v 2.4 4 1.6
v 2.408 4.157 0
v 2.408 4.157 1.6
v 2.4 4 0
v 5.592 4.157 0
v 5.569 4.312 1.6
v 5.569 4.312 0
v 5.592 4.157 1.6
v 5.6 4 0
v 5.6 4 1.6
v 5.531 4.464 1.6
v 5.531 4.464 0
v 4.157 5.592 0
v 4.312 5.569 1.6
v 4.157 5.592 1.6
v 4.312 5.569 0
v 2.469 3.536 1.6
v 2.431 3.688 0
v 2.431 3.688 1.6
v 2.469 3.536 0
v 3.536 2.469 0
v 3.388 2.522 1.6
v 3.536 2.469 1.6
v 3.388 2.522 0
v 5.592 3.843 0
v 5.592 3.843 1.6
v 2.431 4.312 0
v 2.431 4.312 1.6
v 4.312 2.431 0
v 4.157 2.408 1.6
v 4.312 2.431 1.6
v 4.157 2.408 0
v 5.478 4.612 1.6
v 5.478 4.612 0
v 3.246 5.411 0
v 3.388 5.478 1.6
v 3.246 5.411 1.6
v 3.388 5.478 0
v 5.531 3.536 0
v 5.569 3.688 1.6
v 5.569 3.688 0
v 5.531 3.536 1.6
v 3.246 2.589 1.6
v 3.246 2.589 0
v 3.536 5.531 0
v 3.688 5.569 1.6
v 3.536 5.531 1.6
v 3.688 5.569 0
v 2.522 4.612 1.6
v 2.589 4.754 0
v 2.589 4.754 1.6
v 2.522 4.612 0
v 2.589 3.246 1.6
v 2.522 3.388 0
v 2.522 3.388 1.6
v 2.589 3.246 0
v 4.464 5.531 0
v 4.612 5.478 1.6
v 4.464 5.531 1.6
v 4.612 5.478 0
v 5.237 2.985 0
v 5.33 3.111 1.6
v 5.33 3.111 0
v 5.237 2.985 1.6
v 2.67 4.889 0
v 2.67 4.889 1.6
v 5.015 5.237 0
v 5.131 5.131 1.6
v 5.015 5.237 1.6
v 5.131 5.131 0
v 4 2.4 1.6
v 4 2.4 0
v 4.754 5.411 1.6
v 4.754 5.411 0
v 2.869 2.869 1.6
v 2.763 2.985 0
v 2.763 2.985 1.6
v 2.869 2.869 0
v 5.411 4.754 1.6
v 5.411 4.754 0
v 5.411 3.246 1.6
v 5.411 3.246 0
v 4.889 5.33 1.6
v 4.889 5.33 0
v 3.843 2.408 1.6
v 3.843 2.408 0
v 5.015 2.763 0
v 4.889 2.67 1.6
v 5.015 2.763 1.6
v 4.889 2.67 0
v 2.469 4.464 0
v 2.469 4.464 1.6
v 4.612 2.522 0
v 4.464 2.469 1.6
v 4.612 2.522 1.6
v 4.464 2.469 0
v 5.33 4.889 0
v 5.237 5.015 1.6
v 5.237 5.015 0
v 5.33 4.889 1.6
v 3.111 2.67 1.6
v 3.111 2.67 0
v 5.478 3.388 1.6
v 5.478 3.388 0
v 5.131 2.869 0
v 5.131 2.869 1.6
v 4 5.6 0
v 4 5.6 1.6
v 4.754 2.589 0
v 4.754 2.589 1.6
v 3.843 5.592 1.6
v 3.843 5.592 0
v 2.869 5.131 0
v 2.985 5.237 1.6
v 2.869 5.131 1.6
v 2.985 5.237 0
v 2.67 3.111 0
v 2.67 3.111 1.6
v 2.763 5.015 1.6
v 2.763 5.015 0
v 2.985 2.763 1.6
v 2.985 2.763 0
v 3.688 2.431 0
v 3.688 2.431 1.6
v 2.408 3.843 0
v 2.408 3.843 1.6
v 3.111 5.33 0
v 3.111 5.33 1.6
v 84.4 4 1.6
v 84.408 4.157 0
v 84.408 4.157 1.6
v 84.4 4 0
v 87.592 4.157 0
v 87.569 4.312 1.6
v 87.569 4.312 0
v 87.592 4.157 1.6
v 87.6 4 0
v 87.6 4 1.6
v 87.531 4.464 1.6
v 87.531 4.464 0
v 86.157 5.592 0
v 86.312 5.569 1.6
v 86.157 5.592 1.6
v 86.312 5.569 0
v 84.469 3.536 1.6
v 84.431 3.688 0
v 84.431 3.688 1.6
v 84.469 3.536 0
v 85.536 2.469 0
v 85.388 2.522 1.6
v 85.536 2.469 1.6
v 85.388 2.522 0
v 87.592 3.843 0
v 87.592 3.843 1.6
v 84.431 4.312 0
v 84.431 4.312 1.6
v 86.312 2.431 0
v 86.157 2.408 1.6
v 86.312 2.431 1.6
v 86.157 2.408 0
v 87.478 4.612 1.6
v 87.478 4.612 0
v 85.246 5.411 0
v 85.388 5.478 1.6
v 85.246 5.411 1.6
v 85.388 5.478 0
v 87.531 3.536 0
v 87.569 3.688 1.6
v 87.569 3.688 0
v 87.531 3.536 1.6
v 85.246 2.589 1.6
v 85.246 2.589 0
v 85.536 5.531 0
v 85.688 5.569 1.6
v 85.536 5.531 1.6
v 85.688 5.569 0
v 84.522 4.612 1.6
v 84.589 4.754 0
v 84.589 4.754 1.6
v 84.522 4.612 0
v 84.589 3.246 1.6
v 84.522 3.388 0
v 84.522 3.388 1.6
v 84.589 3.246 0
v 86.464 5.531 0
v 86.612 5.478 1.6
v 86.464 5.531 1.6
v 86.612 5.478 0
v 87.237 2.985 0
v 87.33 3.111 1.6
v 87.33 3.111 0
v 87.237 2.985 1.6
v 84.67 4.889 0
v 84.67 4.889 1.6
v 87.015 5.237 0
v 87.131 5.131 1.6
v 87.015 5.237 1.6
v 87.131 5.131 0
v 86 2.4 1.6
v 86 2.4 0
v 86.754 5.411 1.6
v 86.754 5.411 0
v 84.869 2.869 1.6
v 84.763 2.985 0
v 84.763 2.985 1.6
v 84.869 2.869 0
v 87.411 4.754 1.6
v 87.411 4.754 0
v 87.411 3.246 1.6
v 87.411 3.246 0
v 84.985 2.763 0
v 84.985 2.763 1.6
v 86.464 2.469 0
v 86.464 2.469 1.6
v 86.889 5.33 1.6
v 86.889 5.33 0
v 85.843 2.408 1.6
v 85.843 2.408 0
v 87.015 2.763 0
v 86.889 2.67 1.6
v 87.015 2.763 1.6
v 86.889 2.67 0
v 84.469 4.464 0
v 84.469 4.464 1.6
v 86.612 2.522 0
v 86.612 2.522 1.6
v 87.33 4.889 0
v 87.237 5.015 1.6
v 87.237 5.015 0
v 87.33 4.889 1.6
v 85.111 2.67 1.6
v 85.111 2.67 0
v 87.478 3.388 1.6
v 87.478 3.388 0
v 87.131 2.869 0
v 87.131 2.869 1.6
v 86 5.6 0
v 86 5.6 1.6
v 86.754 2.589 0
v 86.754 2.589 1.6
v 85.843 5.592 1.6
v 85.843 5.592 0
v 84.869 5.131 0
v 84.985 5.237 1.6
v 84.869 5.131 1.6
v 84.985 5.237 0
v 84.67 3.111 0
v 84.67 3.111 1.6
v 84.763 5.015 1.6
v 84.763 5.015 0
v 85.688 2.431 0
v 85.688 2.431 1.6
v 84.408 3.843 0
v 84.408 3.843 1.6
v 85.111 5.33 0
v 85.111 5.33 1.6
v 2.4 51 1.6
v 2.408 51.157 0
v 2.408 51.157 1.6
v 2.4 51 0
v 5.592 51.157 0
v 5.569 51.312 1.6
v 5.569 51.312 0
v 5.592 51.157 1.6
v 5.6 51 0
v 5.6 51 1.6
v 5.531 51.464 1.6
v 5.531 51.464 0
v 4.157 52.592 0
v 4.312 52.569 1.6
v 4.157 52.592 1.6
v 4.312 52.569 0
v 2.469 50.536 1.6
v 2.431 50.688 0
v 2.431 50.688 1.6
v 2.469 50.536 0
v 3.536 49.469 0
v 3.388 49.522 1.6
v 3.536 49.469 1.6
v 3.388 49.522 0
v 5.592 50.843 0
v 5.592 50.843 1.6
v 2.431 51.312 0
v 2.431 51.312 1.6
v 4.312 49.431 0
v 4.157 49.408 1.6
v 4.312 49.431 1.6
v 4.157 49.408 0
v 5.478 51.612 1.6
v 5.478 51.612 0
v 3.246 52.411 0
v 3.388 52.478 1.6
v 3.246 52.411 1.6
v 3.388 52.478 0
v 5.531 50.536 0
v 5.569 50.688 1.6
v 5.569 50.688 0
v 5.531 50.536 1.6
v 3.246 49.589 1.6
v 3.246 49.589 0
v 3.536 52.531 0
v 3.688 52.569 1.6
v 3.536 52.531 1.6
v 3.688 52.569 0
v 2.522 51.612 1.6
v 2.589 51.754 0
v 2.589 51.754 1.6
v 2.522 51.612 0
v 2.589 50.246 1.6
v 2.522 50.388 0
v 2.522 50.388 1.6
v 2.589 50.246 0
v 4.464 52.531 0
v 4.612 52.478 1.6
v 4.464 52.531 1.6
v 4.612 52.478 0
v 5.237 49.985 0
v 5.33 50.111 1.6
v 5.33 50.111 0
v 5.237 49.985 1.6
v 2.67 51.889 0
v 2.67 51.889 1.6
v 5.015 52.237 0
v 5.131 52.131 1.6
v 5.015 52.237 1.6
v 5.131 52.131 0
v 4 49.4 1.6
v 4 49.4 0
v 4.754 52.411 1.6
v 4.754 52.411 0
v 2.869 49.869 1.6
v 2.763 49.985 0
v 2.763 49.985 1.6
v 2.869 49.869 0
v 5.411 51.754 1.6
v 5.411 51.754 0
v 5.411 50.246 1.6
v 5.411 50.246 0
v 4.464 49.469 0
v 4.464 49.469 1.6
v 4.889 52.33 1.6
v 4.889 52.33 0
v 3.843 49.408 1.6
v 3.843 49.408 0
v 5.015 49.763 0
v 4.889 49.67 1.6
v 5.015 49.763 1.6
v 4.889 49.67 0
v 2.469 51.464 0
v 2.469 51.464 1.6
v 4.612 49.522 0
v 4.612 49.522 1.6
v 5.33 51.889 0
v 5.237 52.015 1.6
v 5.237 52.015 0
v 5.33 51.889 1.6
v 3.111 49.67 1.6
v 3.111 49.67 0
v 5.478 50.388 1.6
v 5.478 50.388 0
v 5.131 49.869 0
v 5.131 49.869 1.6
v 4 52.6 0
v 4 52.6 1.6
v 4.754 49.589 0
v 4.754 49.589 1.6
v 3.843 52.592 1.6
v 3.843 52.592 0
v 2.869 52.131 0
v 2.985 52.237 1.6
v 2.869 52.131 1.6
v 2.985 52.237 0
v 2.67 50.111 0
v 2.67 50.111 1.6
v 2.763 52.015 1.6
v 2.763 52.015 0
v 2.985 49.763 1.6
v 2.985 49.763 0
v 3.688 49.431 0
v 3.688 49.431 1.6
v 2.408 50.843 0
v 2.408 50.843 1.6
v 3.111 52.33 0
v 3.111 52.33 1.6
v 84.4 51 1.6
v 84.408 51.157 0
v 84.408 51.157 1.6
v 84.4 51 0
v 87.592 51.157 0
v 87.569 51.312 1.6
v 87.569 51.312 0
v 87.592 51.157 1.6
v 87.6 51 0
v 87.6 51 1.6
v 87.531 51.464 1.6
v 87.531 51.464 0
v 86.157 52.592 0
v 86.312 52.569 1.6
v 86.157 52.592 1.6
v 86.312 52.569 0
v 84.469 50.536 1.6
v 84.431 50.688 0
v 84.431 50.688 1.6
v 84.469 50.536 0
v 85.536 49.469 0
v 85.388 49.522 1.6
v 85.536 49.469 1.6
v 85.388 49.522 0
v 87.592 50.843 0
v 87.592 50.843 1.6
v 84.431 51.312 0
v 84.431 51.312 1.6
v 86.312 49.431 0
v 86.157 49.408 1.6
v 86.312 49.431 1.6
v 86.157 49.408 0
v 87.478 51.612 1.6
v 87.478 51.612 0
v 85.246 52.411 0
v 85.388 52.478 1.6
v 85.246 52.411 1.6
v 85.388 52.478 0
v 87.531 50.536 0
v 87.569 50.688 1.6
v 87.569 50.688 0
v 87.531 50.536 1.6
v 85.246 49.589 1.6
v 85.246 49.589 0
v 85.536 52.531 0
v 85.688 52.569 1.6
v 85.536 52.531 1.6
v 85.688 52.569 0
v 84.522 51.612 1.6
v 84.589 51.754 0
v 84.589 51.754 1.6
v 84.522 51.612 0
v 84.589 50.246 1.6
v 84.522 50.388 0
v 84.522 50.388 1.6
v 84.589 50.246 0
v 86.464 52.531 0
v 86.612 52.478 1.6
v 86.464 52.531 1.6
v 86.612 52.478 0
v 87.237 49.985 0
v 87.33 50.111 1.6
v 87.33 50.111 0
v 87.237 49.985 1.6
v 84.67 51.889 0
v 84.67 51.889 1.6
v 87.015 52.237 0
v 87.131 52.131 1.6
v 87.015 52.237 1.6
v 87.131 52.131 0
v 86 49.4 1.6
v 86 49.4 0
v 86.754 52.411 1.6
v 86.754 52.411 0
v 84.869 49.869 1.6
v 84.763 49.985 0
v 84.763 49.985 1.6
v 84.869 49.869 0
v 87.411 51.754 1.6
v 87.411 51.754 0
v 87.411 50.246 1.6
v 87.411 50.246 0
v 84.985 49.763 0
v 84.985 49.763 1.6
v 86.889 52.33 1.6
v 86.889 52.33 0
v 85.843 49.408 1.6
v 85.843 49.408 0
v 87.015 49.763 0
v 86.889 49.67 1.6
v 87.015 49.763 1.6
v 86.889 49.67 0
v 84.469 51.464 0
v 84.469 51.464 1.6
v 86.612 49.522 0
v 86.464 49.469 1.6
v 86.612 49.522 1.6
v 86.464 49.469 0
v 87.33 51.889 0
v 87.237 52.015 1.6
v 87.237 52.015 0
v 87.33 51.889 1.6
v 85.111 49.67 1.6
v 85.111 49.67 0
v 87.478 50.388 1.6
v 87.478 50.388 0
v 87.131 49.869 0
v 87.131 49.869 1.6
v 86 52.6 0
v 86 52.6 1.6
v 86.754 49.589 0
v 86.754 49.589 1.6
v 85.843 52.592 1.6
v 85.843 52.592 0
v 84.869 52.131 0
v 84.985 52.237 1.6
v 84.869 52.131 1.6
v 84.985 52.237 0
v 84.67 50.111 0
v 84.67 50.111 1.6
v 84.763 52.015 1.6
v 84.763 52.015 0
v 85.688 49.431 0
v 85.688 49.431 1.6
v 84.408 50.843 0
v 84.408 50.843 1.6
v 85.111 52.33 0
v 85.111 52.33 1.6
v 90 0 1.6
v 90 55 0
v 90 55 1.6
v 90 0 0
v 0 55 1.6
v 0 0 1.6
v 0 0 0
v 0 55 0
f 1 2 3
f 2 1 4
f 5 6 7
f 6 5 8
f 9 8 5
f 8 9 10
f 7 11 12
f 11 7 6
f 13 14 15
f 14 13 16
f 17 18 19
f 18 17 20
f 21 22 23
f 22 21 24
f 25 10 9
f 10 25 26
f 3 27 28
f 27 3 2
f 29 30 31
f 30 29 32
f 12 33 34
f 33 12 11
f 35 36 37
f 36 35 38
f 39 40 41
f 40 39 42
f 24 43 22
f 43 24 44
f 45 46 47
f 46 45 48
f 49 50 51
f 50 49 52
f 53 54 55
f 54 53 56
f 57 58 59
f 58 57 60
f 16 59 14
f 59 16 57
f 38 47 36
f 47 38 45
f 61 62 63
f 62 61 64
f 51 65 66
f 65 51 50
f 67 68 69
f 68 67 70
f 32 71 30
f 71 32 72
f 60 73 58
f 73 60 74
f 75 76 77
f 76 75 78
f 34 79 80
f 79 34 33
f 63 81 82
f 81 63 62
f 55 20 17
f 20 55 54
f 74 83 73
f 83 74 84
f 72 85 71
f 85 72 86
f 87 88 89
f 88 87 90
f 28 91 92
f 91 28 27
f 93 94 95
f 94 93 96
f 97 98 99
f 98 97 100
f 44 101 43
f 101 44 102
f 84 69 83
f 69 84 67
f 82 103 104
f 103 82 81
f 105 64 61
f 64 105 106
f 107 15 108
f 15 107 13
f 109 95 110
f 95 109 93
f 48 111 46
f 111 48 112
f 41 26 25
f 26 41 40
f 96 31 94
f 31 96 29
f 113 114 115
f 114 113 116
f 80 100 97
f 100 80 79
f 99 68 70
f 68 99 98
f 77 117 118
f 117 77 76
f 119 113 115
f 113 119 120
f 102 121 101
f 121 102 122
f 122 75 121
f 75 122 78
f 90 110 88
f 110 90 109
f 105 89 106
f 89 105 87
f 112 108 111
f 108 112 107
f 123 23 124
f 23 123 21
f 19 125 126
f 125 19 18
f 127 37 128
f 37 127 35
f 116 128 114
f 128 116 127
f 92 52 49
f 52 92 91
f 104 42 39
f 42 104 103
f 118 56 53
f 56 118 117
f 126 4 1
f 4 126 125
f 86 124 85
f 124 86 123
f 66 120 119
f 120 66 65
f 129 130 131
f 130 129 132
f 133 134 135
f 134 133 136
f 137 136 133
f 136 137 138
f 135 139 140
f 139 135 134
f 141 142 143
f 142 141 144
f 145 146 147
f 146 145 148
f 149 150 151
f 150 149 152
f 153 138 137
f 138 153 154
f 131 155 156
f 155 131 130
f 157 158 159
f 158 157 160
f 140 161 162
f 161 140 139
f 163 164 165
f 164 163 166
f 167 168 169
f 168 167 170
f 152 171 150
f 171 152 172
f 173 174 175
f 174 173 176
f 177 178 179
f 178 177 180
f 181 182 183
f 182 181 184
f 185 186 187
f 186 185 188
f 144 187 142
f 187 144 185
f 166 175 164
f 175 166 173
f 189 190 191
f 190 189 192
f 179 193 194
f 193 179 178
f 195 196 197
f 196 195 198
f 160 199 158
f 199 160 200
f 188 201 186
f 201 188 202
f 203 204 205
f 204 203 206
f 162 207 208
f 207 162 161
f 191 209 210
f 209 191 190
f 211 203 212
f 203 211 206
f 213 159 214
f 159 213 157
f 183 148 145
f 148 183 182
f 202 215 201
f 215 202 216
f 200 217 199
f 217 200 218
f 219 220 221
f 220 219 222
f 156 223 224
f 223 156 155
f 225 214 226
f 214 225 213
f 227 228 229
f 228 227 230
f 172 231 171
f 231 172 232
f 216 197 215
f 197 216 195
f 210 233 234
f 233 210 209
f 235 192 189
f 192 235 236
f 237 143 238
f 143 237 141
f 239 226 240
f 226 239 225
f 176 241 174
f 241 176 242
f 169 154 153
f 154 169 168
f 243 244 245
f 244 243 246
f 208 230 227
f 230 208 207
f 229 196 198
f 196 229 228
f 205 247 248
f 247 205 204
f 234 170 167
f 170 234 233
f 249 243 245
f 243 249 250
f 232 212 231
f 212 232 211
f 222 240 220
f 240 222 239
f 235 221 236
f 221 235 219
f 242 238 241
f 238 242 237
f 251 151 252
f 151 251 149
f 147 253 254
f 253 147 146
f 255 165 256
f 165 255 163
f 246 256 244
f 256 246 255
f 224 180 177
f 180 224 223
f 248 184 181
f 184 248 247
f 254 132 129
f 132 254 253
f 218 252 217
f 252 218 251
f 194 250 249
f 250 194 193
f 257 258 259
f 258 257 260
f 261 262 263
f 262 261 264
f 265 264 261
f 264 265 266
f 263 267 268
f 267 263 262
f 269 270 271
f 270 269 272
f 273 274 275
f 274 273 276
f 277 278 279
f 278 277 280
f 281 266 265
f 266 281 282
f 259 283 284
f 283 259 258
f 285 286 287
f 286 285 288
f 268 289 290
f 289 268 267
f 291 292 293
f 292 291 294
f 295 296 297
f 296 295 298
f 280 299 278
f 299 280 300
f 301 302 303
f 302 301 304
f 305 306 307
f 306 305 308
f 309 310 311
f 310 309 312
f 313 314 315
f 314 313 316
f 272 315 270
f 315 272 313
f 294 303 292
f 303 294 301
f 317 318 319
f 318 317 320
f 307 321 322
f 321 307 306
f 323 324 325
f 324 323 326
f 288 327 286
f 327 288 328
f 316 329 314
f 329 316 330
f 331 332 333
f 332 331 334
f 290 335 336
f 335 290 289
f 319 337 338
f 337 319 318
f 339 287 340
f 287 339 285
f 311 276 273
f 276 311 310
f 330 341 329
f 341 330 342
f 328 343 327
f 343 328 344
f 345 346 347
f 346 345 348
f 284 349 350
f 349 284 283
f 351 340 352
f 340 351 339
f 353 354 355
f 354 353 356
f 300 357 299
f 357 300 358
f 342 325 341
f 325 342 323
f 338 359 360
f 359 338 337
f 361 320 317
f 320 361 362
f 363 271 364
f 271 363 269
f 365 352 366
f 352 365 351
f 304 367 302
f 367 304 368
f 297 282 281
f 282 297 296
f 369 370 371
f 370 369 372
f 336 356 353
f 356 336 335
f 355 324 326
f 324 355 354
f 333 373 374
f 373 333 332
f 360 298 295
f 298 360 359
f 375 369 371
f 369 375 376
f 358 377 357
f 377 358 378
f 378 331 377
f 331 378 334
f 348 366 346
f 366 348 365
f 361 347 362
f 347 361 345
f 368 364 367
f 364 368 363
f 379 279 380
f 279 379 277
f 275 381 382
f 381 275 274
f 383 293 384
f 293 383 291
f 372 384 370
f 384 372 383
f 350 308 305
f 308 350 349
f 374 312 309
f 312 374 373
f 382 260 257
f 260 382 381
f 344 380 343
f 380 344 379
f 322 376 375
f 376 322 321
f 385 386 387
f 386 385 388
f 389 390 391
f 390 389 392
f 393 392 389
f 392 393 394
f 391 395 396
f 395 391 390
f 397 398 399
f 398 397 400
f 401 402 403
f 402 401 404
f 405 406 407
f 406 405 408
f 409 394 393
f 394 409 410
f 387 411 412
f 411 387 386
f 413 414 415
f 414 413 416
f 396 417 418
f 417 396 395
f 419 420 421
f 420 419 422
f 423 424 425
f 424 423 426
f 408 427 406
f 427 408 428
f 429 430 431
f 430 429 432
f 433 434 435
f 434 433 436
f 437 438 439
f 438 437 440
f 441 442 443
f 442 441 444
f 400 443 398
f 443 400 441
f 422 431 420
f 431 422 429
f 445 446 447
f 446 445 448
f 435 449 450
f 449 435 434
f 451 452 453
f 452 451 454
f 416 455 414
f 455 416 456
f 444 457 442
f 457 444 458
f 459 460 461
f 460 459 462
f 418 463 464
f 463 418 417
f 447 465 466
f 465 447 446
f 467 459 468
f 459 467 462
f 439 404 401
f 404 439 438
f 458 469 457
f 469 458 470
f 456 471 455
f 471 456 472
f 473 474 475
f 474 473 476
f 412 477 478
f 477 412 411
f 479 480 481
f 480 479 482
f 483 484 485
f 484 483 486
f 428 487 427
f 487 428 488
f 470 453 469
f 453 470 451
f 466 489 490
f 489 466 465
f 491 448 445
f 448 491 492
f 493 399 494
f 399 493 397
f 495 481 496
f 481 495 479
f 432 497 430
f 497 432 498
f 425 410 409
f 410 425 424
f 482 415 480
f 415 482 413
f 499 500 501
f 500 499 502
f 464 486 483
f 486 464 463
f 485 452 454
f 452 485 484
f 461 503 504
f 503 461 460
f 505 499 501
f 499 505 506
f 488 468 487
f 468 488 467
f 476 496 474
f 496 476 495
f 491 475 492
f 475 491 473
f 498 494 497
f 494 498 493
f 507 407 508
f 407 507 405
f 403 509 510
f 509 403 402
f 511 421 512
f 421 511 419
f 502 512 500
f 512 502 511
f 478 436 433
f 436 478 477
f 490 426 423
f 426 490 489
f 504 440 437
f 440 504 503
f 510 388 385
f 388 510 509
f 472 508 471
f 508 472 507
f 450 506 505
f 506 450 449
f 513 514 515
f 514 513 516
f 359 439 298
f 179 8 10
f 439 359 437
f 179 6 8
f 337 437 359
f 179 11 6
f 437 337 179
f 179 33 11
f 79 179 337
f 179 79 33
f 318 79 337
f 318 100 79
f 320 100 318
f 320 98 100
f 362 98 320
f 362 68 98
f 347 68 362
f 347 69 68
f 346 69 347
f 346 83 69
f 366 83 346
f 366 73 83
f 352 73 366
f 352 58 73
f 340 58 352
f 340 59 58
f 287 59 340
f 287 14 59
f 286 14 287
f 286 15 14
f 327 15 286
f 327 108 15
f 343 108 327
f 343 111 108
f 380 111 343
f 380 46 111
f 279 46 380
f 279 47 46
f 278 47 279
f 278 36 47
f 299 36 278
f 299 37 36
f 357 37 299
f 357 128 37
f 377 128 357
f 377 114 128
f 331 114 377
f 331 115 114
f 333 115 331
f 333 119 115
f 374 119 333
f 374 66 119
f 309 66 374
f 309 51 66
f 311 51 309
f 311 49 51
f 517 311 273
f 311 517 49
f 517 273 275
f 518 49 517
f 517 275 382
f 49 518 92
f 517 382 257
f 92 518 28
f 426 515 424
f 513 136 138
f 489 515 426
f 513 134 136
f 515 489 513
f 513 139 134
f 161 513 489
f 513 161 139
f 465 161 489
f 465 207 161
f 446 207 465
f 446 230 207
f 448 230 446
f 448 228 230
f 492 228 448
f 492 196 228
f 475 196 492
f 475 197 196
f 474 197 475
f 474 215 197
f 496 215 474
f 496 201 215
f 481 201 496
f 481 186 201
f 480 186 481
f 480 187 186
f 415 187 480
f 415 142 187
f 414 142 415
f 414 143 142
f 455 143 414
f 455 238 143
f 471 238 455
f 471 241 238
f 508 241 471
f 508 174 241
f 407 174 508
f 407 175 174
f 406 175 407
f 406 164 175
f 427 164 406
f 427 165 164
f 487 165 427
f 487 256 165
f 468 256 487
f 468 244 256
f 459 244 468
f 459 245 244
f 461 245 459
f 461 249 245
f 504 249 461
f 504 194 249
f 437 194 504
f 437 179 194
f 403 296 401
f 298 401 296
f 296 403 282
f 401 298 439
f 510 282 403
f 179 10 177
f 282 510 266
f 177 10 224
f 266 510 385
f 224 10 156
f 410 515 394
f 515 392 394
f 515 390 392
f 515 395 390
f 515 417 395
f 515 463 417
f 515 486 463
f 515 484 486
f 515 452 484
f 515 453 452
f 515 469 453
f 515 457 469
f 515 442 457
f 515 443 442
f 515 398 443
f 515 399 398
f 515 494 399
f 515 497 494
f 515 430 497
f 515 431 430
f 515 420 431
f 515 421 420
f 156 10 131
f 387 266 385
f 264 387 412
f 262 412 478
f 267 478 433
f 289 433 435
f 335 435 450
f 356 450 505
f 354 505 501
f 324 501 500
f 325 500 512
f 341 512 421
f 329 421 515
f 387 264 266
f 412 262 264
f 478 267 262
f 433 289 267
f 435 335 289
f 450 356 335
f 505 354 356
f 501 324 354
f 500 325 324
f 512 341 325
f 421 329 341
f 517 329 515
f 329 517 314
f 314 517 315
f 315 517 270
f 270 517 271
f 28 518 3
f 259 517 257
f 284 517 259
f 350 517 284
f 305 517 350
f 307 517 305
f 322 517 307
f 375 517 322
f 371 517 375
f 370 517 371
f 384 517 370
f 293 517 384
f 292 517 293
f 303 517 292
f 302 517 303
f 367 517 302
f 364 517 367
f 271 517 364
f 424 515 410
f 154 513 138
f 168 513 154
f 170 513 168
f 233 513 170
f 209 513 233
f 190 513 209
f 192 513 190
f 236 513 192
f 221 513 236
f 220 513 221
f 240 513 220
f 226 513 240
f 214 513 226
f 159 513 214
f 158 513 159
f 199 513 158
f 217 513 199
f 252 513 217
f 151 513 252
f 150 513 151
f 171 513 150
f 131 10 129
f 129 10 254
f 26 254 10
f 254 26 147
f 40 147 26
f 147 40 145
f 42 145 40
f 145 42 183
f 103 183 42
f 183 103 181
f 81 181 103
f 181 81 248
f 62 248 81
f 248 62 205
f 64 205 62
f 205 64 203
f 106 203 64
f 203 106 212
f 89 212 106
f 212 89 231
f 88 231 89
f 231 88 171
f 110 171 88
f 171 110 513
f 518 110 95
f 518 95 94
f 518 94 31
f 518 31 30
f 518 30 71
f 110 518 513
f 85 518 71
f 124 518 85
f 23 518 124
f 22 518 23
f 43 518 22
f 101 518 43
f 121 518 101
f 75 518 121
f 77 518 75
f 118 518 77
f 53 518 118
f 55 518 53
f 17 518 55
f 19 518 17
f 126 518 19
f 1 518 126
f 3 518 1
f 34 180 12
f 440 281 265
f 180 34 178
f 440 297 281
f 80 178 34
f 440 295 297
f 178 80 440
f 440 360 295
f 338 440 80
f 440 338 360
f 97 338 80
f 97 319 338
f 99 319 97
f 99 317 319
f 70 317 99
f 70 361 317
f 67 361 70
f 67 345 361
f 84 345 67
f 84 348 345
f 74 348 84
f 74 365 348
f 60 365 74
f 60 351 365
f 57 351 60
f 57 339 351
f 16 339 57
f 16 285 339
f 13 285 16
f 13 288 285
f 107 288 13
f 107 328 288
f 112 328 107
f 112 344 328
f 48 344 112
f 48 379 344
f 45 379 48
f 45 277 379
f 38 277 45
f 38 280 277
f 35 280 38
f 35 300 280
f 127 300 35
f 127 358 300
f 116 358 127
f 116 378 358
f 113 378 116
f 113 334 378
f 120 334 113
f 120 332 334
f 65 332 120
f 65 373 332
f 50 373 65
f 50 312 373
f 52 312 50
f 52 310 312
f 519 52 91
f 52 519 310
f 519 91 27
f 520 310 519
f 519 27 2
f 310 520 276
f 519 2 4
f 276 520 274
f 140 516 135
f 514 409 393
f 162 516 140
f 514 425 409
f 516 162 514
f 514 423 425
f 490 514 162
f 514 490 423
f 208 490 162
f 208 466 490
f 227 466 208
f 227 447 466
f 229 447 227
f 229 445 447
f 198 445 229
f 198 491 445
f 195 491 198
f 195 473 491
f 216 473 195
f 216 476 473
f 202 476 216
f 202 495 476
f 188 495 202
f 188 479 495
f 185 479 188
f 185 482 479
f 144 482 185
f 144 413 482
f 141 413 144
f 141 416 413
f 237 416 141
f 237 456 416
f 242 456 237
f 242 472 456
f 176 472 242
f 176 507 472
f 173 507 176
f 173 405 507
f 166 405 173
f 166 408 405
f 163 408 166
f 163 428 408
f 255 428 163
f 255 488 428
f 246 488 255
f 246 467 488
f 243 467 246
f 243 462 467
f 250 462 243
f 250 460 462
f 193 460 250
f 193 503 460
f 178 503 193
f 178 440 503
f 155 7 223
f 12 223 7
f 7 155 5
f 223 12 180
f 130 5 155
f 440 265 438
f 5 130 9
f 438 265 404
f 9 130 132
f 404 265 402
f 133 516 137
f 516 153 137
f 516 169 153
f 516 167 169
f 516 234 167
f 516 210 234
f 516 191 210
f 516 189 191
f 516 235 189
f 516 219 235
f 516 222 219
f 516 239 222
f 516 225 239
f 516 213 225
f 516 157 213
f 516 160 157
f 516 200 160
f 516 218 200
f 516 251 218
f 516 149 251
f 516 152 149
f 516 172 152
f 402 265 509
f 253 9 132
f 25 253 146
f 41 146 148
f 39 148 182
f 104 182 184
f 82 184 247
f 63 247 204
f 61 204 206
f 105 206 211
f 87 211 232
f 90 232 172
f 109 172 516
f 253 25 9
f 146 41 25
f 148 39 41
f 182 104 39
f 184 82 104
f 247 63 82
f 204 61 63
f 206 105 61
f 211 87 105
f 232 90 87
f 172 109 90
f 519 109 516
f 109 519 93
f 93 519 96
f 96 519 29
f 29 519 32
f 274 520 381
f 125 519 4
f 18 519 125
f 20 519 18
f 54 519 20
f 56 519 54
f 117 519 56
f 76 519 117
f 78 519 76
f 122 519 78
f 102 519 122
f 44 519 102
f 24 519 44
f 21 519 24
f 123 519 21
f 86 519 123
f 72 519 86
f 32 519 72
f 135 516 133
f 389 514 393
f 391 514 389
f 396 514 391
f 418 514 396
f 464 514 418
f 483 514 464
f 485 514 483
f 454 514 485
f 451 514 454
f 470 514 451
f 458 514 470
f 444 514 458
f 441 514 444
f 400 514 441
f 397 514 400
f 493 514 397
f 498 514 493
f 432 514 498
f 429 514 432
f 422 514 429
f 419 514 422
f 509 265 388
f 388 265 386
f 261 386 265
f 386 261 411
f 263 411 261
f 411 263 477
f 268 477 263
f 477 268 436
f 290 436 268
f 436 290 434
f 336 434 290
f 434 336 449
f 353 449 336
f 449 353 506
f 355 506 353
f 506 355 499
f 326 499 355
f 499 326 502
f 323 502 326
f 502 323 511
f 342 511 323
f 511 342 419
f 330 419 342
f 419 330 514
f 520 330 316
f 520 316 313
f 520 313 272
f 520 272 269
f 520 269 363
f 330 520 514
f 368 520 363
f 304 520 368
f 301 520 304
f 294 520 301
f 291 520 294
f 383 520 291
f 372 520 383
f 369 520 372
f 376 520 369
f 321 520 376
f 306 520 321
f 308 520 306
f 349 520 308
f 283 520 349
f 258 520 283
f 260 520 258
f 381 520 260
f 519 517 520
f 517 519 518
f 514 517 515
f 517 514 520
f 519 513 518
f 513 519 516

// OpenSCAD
// GEOMETRIC OUTLINE ONLY. Not an enclosure or populated-board fit approval.
// Export STL from OpenSCAD for a K1/K1 Max outline fit print.
$fn=64;
difference(){
  cube([90,55,1.6]);
  for(p=[[4,4],[86,4],[4,51],[86,51]])
    translate([p[0],p[1],-0.1]) cylinder(h=1.8,d=3.2);
}
